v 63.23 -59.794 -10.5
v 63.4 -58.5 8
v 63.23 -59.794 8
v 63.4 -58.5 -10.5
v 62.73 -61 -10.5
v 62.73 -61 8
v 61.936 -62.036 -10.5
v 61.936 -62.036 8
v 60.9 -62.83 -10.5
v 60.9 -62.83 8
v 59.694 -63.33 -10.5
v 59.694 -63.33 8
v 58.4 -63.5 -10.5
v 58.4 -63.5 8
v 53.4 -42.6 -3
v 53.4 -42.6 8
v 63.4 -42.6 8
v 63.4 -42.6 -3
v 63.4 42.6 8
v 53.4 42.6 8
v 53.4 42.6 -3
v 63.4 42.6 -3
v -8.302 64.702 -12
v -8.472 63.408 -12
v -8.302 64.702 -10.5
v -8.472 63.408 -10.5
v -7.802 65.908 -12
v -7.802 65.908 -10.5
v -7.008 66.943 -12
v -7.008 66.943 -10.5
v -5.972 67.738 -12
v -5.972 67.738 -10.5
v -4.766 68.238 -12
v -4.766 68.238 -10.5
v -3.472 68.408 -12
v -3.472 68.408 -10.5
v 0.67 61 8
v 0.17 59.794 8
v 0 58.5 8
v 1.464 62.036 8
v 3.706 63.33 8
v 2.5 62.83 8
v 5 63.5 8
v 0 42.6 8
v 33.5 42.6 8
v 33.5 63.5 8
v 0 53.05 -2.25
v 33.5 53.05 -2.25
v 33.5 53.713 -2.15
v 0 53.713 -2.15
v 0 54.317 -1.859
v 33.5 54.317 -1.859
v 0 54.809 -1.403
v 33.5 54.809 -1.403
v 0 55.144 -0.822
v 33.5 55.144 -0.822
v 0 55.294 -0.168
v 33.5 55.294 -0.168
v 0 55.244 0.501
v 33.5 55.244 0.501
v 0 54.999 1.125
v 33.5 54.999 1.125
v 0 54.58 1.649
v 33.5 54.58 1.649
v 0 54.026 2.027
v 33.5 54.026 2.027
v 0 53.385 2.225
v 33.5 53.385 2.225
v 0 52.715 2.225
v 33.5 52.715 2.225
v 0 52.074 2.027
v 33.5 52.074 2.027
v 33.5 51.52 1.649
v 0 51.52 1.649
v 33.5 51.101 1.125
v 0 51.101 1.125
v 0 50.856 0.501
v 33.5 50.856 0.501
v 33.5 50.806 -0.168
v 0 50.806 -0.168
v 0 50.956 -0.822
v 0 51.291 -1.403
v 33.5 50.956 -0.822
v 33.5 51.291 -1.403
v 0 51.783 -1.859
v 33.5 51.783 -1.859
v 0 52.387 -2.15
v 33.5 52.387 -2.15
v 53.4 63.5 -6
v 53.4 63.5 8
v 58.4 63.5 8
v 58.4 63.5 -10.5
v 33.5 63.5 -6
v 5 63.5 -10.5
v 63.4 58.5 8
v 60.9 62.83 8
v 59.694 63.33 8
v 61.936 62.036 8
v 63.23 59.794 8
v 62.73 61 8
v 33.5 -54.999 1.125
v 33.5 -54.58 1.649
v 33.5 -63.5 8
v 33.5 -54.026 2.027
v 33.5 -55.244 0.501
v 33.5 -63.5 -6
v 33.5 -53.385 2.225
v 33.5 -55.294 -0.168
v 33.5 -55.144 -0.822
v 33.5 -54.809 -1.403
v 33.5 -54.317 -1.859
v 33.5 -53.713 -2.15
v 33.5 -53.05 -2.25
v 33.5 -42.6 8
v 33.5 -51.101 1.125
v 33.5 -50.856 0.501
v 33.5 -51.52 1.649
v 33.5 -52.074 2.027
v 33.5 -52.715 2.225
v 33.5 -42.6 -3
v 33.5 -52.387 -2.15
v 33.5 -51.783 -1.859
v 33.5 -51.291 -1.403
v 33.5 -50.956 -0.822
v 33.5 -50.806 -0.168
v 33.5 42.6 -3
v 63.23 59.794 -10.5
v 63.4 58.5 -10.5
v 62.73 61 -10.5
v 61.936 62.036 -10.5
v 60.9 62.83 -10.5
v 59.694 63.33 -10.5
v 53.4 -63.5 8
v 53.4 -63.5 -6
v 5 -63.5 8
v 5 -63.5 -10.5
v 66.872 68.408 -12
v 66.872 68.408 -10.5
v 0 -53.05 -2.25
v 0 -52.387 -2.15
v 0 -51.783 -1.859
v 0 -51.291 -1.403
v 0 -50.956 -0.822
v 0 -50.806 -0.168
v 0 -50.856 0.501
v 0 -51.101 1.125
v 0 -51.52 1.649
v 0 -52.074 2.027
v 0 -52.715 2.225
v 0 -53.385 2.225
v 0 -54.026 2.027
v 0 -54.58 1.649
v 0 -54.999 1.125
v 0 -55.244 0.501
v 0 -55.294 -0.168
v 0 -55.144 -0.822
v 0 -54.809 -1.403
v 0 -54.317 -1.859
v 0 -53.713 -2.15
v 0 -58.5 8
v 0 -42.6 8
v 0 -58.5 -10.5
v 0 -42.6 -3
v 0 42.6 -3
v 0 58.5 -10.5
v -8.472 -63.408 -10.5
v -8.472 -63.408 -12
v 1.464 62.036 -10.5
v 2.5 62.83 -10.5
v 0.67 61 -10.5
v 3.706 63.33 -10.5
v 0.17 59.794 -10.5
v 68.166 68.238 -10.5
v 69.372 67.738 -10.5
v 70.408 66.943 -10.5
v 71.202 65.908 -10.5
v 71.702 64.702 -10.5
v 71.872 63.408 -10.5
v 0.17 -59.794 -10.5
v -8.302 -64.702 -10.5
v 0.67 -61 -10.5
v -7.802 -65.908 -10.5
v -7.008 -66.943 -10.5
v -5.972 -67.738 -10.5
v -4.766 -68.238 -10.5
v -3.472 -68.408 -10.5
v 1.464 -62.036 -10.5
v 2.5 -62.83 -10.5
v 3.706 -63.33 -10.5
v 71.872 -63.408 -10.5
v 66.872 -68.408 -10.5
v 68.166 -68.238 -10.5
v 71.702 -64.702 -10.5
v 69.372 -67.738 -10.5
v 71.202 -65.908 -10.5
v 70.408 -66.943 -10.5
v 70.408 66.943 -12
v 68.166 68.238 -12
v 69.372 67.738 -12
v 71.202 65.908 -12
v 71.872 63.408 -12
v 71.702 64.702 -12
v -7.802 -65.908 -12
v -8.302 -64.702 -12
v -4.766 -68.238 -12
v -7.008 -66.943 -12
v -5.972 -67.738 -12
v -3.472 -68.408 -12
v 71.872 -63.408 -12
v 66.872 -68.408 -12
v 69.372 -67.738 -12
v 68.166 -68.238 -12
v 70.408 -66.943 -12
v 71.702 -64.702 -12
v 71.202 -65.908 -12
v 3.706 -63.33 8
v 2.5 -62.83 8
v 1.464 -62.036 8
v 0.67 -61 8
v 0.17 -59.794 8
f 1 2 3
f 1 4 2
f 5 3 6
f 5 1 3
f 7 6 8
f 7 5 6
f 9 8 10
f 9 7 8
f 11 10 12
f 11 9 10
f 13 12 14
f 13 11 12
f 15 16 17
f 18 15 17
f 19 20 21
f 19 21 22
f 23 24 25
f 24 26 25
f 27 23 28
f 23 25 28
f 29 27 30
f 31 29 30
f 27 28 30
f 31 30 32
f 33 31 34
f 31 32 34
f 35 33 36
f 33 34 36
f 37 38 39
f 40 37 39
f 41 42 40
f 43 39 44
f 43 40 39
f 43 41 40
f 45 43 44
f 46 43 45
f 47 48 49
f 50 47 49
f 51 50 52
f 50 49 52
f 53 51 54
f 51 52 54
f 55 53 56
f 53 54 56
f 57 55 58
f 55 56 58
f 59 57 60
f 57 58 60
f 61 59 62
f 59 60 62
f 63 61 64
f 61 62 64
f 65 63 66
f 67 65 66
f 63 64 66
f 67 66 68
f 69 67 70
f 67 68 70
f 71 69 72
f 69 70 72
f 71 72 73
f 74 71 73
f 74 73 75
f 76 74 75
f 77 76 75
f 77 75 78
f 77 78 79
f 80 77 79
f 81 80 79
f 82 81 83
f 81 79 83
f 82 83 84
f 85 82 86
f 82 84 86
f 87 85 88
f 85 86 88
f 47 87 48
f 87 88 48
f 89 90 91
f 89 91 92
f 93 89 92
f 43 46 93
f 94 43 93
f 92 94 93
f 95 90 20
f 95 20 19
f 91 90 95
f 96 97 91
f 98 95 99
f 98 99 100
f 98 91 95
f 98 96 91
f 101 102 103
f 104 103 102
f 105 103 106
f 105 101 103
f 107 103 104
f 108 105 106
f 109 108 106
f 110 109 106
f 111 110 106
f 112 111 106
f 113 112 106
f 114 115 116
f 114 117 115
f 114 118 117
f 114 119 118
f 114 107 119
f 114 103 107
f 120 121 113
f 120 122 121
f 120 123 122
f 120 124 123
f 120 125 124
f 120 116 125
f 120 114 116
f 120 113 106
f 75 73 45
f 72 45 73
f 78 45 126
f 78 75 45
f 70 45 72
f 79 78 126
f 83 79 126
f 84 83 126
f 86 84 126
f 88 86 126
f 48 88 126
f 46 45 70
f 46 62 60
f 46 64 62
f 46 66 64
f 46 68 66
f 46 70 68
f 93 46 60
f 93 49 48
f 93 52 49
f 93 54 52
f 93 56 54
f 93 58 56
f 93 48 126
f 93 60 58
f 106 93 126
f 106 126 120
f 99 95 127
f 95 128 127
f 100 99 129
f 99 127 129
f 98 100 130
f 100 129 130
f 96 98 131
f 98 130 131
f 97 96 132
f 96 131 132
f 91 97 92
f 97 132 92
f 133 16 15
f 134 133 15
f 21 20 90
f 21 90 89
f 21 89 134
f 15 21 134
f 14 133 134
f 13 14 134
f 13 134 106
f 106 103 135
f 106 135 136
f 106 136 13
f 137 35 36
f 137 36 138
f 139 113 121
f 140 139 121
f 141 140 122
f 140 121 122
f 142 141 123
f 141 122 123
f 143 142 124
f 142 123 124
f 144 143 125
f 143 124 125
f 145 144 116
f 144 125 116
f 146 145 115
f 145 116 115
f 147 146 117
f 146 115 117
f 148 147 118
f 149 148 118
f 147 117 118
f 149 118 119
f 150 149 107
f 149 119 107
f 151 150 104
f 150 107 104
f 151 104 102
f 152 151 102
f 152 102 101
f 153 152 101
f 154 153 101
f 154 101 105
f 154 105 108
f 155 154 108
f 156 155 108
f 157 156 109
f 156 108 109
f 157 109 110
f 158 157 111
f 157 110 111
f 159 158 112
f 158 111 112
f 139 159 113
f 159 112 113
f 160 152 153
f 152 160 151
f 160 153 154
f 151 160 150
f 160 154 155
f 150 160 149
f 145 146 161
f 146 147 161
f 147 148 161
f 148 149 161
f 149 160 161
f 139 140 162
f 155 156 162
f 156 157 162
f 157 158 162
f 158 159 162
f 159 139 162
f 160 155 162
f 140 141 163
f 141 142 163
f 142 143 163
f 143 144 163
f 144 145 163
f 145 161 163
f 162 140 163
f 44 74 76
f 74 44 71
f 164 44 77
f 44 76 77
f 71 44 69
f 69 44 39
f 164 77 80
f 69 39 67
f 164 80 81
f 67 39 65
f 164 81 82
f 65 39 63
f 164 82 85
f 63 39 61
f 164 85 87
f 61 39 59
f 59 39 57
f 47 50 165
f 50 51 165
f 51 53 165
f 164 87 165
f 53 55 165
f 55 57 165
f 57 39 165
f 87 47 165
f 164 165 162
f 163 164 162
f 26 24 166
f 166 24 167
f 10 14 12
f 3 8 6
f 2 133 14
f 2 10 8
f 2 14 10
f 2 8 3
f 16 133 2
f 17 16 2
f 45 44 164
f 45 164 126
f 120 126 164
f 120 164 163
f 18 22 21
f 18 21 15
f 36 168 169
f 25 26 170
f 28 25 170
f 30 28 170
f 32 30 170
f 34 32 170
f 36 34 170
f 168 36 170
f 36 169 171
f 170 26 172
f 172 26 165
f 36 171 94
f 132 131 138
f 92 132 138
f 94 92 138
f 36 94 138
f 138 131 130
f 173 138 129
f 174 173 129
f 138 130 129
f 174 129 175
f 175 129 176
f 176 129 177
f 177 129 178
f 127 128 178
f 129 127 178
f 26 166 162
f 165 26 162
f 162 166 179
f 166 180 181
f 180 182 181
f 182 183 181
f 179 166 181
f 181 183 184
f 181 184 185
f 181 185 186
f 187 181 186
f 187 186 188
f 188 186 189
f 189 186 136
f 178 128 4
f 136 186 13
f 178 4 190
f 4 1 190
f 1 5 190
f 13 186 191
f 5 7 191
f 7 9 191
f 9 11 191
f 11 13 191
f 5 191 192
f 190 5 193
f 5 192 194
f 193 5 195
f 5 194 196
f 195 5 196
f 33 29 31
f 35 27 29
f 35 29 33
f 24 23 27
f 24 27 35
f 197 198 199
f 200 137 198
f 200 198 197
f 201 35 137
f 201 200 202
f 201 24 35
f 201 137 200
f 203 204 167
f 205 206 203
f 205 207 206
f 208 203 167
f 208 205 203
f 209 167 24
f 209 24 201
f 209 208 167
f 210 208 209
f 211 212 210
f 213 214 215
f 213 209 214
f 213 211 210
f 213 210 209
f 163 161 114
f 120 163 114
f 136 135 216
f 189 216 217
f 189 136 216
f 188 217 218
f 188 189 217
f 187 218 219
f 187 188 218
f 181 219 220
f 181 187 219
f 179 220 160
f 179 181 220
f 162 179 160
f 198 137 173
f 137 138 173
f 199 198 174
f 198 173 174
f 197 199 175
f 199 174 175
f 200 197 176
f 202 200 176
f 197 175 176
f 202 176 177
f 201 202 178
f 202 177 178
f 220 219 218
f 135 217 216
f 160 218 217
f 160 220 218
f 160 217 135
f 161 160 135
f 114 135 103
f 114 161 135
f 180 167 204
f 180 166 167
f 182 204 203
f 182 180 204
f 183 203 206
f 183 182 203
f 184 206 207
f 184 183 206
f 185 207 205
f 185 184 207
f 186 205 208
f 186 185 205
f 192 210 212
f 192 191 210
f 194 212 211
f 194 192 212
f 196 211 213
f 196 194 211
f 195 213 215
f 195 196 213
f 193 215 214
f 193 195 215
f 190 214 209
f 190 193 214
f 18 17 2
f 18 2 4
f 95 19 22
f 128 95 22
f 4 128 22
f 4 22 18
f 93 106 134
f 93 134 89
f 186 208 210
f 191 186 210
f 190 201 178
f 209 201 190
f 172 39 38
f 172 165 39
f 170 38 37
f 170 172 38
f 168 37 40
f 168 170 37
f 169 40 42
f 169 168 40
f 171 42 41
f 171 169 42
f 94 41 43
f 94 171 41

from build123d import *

# Parameters (mm, degrees)
F0_W      = 24
F0_H      = 127
F1_DEPTH  = 33.5
F2_W      = 6
F2_H      = 127
F3_DEPTH  = 19.9
F5_W      = 24
F5_H      = 127
F6_DEPTH  = 10
F7_W      = 85.2
F7_H      = 33.5
F7_H_2    = 10
F8_DEPTH  = 15
F4_R      = 2.25
F9_DEPTH  = 33.5
F11_ANGLE = 90
F12_W     = 63.4
F12_H     = 127
F13_DEPTH = 4
F14_W     = 80.3440480709
F14_H     = 136.8158757687
F15_DEPTH = 1.5
F16_R     = 5


with BuildPart() as f1:
    # F0 (on Top) → F1 (new body)
    with BuildSketch(Plane.XY):
        Rectangle(F0_W, F0_H)
    extrude(amount=F1_DEPTH)

    # F2 (on face) → F3 (join)
    with BuildSketch(Plane.XY.offset(33.5)):
        with Locations((9, 0)):
            Rectangle(F2_W, F2_H)
    extrude(amount=F3_DEPTH)

    # F5 (on face) → F6 (join)
    with BuildSketch(Plane.XY.offset(53.4)):
        Rectangle(F5_W, F5_H)
    extrude(amount=F6_DEPTH)

    # F7 (on face) → F8 (cut)
    with BuildSketch(Plane(origin=(-12, 0, 0), x_dir=(0, -1, 0), z_dir=(-1, 0, 0))):
        with Locations((0, 16.75)):
            Rectangle(F7_W, F7_H)
        with Locations((0, 58.4)):
            Rectangle(F7_W, F7_H_2)
    extrude(amount=-F8_DEPTH, mode=Mode.SUBTRACT)

    # F4 (on face) → F9 (cut, through all)
    with BuildSketch(Plane.XY.offset(33.5)):
        with Locations((0, 53.05)):
            Circle(F4_R)
        with Locations((0, -53.05)):
            Circle(F4_R)
    extrude(amount=-F9_DEPTH, mode=Mode.SUBTRACT)


with BuildPart() as f1_1:
    # F11: moved
    add(f1.part.rotate(Axis((0, -2.2393353283, 0), (0, 1, 0)), F11_ANGLE))

    # F12 (on face) → F13 (cut)
    with BuildSketch(Plane.XY.offset(12)):
        with Locations((31.7, 0)):
            Rectangle(F12_W, F12_H)
    extrude(amount=-F13_DEPTH, mode=Mode.SUBTRACT)

    # F14 (on face) → F15 (join)
    with BuildSketch(Plane(origin=(0, 0, -12), x_dir=(1, 0, 0), z_dir=(0, 0, -1))):
        with Locations((31.7, 0)):
            Rectangle(F14_W, F14_H)
    extrude(amount=-F15_DEPTH)

    # F16
    f16_edges = [f1_1.edges().sort_by_distance(p)[0] for p in [
        (63.4, 63.5, -1.25),
        (0, 63.5, -1.25),
        (-8.472024, 68.407938, -11.25),
        (71.872024, 68.407938, -11.25),
        (0, -63.5, -1.25),
        (63.4, -63.5, -1.25),
        (71.872024, -68.407938, -11.25),
        (-8.472024, -68.407938, -11.25),
    ]]
    fillet(f16_edges, radius=F16_R)


solid = f1_1.part
